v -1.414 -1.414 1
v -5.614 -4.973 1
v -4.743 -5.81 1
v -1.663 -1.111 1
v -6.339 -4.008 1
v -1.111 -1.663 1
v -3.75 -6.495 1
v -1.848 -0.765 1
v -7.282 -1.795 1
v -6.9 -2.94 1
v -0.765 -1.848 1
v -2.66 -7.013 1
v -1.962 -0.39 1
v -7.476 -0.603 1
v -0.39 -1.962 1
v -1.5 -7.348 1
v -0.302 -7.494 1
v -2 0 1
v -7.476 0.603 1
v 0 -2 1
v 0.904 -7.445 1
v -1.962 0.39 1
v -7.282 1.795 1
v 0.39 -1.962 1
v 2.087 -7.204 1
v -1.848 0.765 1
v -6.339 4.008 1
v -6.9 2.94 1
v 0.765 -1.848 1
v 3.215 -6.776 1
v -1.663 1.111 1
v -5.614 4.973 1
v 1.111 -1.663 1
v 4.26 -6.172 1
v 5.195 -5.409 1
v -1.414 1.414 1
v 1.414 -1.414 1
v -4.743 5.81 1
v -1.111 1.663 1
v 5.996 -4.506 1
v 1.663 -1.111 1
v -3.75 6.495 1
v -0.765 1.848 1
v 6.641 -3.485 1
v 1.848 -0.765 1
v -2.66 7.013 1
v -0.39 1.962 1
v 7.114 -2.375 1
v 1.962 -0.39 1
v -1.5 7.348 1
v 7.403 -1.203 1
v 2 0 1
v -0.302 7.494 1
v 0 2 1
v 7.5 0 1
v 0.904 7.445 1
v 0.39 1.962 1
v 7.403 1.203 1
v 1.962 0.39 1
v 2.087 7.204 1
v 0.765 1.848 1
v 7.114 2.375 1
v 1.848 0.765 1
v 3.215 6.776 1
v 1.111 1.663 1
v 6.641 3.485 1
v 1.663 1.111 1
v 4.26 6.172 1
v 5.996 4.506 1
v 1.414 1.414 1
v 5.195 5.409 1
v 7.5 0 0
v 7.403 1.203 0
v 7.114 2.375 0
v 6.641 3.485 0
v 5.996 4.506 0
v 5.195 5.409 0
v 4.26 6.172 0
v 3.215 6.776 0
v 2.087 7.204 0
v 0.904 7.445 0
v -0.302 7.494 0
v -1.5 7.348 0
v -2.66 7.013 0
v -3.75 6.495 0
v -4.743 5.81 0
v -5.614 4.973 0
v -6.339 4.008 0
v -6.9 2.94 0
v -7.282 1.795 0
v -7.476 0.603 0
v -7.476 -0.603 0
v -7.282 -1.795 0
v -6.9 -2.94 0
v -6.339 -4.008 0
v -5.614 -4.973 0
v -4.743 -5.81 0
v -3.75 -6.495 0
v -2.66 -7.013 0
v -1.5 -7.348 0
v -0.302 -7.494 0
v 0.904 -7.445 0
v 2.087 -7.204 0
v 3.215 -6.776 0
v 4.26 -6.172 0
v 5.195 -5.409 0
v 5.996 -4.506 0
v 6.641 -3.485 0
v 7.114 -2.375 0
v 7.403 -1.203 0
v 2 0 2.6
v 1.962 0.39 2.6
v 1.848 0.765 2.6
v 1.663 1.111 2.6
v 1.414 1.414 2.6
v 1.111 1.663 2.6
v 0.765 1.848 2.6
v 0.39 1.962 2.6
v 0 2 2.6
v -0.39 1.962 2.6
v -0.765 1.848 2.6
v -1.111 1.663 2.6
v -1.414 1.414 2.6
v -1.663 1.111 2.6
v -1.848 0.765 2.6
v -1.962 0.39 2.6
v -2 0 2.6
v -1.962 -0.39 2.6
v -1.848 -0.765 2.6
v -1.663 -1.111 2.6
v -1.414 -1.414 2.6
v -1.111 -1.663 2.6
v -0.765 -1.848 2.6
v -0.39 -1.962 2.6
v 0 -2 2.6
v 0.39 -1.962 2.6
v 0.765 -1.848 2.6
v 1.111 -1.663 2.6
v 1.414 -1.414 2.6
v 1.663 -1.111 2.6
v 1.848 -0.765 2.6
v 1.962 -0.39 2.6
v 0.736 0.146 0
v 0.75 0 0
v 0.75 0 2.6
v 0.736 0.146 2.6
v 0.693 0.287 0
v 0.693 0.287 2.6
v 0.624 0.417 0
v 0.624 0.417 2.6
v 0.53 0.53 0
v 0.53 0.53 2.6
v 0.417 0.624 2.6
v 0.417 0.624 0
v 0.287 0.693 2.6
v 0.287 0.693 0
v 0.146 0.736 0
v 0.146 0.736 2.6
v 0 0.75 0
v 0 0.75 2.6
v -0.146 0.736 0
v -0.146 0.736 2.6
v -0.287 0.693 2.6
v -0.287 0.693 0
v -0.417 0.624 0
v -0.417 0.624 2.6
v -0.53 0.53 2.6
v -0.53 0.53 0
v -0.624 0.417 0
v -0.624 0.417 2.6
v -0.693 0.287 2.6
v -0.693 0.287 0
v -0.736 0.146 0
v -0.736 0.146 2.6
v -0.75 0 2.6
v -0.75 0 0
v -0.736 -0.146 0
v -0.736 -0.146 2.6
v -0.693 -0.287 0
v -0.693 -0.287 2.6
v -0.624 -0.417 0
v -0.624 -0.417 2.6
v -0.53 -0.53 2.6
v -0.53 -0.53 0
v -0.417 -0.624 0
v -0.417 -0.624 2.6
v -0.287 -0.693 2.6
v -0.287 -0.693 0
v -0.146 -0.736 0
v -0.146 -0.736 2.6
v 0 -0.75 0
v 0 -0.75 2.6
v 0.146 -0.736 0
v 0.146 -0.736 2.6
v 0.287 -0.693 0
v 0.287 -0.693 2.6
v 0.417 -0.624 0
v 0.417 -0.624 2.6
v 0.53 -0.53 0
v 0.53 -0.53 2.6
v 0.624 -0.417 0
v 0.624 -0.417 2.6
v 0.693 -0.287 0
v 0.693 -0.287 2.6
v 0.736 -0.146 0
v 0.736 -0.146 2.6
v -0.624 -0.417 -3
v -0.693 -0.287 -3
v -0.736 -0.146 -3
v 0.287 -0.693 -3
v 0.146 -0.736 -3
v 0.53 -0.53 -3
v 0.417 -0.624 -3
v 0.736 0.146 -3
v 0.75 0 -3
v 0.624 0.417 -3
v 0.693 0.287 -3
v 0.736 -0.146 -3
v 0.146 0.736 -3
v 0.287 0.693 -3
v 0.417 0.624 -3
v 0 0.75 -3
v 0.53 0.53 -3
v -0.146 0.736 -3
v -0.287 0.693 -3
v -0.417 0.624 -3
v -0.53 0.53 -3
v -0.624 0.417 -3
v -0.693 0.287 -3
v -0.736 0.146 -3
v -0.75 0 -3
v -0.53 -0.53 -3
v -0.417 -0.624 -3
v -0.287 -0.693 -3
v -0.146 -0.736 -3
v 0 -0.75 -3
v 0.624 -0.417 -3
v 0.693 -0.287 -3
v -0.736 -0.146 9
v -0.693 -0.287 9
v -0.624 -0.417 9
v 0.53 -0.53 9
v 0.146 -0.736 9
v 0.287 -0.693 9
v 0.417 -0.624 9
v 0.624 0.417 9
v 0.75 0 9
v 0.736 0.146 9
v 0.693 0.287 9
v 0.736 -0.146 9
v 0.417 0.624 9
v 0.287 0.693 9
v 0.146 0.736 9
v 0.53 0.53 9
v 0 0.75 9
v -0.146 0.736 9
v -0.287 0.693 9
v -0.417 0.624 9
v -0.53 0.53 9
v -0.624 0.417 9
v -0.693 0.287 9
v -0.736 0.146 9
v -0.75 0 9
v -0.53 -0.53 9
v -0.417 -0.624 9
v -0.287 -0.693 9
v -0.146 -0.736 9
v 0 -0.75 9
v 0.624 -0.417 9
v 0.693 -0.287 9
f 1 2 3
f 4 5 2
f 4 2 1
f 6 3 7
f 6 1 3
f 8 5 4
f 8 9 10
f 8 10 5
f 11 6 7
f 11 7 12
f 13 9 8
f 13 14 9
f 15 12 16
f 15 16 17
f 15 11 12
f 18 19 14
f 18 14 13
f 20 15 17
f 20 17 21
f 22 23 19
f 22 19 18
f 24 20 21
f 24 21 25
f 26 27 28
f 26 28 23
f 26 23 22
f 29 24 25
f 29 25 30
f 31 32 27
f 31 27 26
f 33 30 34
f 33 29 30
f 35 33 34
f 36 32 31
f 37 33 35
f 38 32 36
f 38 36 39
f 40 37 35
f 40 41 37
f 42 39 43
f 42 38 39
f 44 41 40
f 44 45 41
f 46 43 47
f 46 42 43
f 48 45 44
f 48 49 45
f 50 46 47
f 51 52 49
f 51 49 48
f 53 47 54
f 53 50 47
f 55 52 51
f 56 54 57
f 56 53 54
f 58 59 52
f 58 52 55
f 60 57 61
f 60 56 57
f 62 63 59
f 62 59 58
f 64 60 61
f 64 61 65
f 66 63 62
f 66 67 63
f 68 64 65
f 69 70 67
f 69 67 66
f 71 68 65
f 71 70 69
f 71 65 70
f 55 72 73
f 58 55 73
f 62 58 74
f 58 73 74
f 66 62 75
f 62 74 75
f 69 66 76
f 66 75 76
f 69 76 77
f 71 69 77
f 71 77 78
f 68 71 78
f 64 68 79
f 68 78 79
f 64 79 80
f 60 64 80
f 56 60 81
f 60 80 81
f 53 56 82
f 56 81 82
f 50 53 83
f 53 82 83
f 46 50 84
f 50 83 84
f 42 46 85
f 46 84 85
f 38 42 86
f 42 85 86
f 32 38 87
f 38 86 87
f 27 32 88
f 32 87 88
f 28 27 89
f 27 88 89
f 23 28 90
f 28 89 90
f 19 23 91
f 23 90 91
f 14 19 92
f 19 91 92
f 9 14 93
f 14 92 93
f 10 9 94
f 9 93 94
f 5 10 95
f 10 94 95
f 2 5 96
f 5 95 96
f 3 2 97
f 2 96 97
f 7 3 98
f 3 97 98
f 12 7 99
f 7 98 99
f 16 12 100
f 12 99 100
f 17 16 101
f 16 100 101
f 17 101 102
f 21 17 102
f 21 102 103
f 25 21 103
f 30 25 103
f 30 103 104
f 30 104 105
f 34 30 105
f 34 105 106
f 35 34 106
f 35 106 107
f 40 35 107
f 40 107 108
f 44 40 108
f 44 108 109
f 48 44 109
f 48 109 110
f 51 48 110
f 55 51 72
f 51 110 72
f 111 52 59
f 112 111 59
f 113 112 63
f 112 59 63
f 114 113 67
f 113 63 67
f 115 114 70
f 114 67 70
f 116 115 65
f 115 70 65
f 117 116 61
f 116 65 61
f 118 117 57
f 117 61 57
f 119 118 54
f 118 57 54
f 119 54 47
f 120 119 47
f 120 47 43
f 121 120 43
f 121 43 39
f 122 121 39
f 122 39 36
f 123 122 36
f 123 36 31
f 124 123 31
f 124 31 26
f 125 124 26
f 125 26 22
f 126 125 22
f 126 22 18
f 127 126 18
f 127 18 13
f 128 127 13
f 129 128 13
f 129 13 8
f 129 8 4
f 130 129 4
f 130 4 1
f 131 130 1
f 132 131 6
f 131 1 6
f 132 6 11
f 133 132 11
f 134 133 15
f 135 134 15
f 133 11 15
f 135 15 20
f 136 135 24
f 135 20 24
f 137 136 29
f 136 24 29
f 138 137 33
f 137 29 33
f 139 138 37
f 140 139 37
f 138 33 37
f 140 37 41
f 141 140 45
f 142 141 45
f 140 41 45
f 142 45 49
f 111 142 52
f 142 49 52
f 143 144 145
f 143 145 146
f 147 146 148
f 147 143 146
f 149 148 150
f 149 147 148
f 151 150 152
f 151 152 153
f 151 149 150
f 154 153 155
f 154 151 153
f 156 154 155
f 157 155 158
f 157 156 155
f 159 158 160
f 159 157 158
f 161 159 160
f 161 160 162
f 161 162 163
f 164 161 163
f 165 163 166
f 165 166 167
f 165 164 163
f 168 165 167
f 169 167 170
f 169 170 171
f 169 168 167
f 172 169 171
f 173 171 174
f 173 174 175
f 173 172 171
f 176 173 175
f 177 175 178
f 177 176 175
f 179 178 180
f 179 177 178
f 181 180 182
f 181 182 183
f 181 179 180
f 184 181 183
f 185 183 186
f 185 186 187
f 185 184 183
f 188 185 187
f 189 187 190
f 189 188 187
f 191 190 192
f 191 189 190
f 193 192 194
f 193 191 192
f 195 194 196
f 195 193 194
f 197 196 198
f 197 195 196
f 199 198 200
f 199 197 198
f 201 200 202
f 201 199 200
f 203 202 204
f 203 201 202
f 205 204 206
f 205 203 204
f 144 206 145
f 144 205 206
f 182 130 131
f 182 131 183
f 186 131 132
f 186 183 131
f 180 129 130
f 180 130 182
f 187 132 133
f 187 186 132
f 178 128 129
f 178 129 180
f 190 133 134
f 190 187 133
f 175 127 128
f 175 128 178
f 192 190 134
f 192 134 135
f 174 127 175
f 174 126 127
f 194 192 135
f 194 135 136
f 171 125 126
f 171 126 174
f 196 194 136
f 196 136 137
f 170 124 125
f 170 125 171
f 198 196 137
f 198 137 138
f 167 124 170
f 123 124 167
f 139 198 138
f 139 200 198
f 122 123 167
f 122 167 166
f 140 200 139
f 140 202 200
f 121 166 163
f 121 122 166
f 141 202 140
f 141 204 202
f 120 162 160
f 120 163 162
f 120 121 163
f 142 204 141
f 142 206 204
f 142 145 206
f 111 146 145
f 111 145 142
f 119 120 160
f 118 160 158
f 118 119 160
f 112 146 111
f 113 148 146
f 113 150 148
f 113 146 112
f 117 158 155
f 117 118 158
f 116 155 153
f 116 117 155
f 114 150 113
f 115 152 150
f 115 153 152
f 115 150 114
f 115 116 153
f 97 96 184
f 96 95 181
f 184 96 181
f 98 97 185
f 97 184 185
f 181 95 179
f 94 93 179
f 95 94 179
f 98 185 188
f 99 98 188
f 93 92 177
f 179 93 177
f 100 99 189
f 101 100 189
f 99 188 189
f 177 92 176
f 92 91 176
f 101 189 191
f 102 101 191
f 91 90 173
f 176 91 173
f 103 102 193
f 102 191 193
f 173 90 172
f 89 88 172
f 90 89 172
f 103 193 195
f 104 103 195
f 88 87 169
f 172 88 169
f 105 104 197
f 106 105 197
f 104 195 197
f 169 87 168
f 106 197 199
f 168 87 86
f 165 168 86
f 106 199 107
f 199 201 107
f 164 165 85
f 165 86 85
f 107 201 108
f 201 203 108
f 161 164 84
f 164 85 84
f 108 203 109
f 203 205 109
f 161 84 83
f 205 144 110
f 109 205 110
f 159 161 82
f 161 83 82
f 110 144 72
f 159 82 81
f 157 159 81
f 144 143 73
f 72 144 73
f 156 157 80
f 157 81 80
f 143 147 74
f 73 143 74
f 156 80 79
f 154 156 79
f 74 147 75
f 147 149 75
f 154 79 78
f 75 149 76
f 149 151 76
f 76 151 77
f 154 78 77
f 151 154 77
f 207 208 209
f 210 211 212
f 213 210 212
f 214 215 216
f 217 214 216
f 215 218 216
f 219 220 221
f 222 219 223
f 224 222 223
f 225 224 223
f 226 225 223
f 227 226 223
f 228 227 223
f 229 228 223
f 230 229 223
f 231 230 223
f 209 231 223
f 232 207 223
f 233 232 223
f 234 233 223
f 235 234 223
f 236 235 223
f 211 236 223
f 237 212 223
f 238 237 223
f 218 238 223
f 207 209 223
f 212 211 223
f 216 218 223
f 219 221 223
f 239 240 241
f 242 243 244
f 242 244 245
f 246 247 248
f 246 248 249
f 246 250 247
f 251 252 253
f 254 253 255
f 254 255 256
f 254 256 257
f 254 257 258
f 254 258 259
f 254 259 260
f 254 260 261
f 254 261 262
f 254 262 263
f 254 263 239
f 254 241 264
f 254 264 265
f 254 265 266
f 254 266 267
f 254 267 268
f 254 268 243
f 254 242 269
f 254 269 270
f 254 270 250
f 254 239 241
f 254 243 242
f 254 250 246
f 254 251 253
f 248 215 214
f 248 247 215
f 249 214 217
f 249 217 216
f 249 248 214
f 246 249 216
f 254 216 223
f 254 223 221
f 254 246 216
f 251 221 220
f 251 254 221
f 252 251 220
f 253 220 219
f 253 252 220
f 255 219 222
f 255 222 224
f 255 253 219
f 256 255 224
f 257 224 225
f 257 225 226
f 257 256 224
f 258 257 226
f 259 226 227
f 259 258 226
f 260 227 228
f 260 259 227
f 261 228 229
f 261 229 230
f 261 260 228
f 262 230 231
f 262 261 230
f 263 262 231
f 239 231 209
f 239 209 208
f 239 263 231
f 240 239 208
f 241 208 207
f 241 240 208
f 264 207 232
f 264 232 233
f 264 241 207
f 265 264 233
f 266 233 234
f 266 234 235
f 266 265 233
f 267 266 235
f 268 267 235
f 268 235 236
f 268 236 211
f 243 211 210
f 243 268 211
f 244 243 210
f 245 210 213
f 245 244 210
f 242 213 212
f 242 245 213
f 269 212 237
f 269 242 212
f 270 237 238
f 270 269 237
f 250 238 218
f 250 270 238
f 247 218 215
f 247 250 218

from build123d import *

# Parameters (mm, degrees)
F0_R          = 7.5
F0_R_2        = 2
F1_DEPTH      = 1
F0_R_3        = 0.75
F2_DEPTH      = 2.6
F3_DEPTH      = 9
F3_DEPTH_BACK = 3


with BuildPart() as f1:
    # F0 (on Top) → F1 (new body)
    with BuildSketch(Plane.XY):
        Circle(F0_R)
        Circle(F0_R_2, mode=Mode.SUBTRACT)
    extrude(amount=F1_DEPTH)

    # F0 (on Top) → F2 (join)
    with BuildSketch(Plane.XY):
        Circle(F0_R_2)
        Circle(F0_R_3, mode=Mode.SUBTRACT)
    extrude(amount=F2_DEPTH)


with BuildPart() as f3:
    # F0 (on Top) → F3 (new body, two sides)
    with BuildSketch(Plane.XY) as f3_sk:
        Circle(F0_R_3)
    extrude(amount=F3_DEPTH)
    extrude(f3_sk.sketch, amount=-F3_DEPTH_BACK)


solid = Compound([f1.part, f3.part])
